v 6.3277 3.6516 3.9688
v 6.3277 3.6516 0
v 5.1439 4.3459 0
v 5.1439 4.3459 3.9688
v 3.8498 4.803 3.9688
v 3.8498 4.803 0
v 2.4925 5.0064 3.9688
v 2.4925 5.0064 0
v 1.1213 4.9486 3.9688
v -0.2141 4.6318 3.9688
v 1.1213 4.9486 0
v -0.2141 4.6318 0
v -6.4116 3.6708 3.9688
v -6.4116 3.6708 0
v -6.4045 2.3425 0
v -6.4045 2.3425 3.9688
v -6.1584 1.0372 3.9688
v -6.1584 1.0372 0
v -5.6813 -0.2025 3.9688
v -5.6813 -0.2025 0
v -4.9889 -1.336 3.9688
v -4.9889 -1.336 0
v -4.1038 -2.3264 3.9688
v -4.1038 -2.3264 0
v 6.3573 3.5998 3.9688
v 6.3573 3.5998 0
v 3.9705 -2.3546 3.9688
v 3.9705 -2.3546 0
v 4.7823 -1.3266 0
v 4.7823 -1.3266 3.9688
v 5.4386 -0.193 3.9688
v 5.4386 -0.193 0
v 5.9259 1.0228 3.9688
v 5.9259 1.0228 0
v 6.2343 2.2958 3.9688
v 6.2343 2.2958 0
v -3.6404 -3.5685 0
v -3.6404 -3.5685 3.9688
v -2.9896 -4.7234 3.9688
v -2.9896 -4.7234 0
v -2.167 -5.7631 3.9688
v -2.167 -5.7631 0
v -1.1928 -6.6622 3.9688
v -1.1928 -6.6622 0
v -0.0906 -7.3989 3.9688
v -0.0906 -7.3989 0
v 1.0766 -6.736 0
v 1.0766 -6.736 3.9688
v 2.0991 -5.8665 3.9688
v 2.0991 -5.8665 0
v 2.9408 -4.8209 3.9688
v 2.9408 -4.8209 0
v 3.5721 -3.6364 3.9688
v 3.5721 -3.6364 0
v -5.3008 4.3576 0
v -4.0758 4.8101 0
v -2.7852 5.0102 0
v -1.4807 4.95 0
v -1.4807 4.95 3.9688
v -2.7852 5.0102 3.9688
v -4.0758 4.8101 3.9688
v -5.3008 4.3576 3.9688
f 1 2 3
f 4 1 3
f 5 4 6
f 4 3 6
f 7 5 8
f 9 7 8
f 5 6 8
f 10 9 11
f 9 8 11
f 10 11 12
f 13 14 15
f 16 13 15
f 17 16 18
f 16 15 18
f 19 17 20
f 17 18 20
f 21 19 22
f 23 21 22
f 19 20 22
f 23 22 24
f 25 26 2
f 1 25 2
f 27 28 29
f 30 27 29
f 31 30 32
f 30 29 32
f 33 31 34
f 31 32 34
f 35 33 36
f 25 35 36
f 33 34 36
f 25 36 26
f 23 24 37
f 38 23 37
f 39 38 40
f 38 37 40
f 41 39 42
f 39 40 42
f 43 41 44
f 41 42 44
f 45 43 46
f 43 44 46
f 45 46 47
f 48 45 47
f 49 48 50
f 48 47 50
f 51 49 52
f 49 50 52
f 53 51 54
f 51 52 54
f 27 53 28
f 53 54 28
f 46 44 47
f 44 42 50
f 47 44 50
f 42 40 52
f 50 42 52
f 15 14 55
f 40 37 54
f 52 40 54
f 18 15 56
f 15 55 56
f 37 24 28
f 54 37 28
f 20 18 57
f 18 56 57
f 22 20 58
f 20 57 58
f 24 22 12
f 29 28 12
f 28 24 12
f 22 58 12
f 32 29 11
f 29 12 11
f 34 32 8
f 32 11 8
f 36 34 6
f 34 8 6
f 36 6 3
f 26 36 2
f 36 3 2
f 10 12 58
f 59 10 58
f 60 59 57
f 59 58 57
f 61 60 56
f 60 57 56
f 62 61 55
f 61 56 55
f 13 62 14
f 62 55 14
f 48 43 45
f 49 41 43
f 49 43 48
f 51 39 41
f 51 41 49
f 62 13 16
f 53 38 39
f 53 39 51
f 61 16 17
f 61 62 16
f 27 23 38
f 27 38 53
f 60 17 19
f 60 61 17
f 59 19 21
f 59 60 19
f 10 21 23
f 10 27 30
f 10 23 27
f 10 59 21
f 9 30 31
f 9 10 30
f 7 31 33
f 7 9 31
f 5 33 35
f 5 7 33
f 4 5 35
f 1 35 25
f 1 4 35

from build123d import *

# Parameters (mm, degrees)
F1_DEPTH = 3.96875


with BuildPart() as f1:
    # F0 (on Top) → F1 (new body)
    with BuildSketch(Plane.XY):
        with BuildLine():
            Line((6.357343, 3.599845), (6.327746, 3.651619))
            ThreePointArc((6.327746, 3.651619), (3.176014, 4.937132), (-0.214079, 4.631808))
            ThreePointArc((-0.214079, 4.631808), (-3.435517, 4.94244), (-6.411583, 3.670753))
            ThreePointArc((-6.411583, 3.670753), (-5.947905, 0.406573), (-4.103787, -2.326392))
            ThreePointArc((-4.103787, -2.326392), (-2.598583, -5.259348), (-0.090588, -7.398935))
            ThreePointArc((-0.090588, -7.398935), (2.544544, -5.363511), (3.970517, -2.354611))
            ThreePointArc((3.970517, -2.354611), (5.704057, 0.406109), (6.357343, 3.599845))
        make_face()
    extrude(amount=F1_DEPTH)


solid = f1.part
